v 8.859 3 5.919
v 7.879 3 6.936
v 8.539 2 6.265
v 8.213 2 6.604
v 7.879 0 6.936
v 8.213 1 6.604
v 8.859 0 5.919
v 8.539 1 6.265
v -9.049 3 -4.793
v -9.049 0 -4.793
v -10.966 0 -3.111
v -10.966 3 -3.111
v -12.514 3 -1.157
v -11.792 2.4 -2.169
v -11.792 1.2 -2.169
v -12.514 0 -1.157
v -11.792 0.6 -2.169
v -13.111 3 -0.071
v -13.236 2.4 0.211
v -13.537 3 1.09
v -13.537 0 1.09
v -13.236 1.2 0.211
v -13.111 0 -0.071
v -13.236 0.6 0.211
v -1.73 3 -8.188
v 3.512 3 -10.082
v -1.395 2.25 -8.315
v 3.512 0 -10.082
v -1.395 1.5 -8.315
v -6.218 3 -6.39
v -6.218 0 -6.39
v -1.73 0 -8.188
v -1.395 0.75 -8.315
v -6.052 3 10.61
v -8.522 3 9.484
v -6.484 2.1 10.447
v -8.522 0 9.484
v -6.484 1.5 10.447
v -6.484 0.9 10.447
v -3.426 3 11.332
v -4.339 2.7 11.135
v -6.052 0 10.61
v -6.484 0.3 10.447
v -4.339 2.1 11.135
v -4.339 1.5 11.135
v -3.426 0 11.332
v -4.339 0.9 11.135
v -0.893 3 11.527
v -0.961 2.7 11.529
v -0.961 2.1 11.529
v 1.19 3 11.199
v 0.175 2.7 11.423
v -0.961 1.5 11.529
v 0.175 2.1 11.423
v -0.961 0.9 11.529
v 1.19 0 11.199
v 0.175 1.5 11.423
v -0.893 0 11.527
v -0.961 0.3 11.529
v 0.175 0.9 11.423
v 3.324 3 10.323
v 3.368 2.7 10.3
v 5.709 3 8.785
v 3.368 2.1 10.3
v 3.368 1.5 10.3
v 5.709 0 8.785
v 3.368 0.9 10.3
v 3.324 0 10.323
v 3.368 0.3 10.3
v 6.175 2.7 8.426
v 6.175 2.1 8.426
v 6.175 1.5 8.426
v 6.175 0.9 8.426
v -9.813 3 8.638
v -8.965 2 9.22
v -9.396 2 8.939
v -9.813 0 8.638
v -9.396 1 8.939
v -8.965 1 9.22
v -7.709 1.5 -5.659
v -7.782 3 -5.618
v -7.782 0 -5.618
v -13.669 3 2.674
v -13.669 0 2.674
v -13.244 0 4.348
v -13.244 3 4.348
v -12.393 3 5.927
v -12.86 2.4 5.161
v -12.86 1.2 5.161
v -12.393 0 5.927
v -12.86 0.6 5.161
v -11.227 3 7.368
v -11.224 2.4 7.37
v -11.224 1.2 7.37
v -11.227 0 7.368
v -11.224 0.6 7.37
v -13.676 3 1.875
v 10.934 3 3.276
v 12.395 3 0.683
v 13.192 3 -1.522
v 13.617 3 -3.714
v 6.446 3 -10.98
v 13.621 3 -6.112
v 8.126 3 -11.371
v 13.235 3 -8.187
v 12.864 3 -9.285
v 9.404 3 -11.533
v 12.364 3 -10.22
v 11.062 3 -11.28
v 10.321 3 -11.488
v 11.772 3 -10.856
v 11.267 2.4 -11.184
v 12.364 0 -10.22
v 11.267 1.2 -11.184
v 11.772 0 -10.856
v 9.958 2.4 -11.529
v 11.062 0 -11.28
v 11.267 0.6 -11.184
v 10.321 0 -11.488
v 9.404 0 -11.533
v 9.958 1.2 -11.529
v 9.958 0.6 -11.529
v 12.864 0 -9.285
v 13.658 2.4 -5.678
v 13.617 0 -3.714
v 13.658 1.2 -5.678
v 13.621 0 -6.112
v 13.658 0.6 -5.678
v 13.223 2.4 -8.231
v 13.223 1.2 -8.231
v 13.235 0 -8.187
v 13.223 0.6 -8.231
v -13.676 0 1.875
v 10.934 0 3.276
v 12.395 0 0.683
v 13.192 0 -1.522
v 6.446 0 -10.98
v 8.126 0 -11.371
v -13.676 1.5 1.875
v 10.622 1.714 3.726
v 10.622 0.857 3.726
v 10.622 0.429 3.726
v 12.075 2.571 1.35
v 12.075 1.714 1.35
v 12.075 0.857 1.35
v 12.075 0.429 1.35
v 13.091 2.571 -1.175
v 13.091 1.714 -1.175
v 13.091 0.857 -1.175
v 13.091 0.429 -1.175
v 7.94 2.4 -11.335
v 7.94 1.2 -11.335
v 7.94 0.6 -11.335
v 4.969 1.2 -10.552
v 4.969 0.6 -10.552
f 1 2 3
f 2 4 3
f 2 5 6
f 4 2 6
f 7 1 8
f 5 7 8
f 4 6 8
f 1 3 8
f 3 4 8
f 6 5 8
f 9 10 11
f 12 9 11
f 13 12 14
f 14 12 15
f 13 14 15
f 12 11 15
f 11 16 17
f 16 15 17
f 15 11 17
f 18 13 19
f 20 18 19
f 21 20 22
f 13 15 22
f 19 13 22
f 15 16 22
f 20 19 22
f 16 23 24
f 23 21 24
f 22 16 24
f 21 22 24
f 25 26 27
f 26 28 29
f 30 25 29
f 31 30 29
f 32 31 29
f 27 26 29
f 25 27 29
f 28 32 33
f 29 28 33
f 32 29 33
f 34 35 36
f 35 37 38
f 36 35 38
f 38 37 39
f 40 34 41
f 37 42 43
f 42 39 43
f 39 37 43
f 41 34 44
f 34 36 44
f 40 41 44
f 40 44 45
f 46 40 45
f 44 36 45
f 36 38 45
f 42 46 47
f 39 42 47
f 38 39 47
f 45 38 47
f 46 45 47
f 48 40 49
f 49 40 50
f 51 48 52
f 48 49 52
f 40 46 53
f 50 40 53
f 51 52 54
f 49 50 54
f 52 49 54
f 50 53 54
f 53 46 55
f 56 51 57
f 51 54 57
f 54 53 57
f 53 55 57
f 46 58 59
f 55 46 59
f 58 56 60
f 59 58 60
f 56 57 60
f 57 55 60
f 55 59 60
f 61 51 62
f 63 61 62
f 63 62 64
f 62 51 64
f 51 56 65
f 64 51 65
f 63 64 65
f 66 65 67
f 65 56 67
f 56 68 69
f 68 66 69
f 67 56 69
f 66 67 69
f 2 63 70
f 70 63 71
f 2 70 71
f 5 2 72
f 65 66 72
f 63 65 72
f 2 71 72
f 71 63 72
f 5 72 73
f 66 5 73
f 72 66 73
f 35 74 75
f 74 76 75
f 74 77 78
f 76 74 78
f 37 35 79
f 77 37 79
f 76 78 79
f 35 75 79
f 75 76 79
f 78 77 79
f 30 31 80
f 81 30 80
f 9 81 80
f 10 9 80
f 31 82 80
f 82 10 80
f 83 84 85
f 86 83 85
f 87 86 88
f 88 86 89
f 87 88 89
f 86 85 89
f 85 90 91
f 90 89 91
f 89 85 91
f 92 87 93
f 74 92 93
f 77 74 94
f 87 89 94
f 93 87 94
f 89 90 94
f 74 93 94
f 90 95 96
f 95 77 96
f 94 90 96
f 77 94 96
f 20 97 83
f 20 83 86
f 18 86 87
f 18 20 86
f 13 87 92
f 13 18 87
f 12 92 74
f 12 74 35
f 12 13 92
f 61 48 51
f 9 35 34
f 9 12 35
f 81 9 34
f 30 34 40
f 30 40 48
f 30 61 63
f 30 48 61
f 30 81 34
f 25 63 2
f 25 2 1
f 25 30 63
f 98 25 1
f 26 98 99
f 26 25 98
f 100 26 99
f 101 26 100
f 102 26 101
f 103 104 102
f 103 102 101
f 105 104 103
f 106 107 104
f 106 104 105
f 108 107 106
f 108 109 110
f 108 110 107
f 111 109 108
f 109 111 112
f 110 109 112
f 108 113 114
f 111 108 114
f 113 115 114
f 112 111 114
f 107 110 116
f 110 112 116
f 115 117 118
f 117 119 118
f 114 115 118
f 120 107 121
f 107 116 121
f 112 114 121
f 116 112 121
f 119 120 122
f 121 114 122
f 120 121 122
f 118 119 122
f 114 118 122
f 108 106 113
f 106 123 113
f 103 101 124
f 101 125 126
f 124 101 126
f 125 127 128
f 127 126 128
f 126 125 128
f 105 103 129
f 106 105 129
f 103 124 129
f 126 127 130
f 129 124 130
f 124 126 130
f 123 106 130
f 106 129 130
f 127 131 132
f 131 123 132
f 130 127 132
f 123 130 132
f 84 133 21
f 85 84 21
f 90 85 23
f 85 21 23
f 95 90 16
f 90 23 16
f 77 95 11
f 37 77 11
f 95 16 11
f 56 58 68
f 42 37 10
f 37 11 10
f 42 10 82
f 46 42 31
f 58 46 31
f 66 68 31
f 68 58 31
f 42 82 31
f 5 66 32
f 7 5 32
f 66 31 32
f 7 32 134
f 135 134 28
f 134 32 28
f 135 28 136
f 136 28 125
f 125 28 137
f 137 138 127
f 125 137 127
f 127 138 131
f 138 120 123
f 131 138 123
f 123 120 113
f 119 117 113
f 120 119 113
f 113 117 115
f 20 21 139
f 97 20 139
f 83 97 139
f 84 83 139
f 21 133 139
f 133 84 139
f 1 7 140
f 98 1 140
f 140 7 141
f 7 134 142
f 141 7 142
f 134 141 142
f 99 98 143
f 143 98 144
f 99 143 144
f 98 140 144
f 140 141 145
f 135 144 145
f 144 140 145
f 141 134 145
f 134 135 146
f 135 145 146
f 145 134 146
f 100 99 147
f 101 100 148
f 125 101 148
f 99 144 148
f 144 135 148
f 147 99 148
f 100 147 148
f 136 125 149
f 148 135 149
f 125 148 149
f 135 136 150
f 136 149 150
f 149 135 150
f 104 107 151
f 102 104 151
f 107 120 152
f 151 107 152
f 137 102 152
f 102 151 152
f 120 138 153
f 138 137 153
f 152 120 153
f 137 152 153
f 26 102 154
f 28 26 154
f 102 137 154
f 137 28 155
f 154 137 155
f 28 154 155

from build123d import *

# Parameters (mm, degrees)
BOSS_EXTRUDE1_DEPTH = 3


with BuildPart() as part:
    # Sketch1 → Boss-Extrude1 (new body)
    with BuildSketch(Plane(origin=(0, 0, 0), x_dir=(1, 0, 0), z_dir=(0, 1, 0))):
        with BuildLine():
            add(Edge.make_bspline(
                [(3.511635356, 10.081993119), (2.683777353, 9.804613769), (1.863835552, 9.515160329), (0.230253693, 8.923789795), (-0.583224169, 8.621607026), (-2.206396034, 8.008419395), (-3.016273743, 7.697632699), (-4.628962954, 7.062163318), (-5.432747453, 6.738927399), (-6.217926269, 6.389737786)],
                knots=[0, 0, 0, 0, 0.25, 0.25, 0.5, 0.5, 0.75, 0.75, 1, 1, 1, 1], degree=3))
            add(Edge.make_bspline(
                [(-6.217926269, 6.389737786), (-6.732382818, 6.160945466), (-7.234463683, 5.921622924), (-8.183546206, 5.395455991), (-8.62655194, 5.105271334), (-9.048790314, 4.793117258)],
                knots=[0, 0, 0, 0, 0.5, 0.5, 1, 1, 1, 1], degree=3))
            add(Edge.make_bspline(
                [(-9.048790314, 4.793117258), (-9.572593815, 4.405877707), (-10.062014593, 3.992496155), (-10.976896057, 3.118992822), (-11.403271889, 2.656862502), (-12.180538449, 1.681198167), (-12.530629341, 1.166730201), (-12.980065384, 0.35150706), (-13.116293965, 0.073646384), (-13.355224075, -0.496551983), (-13.458532141, -0.788753111), (-13.537102217, -1.090483077)],
                knots=[0, 0, 0, 0, 0.25, 0.25, 0.5, 0.5, 0.75, 0.75, 0.875, 0.875, 1, 1, 1, 1], degree=3))
            add(Edge.make_bspline(
                [(-13.537102217, -1.090483077), (-13.604503338, -1.349321289), (-13.653312348, -1.610669429), (-13.698633086, -2.138427716), (-13.694766801, -2.404844782), (-13.669095991, -2.674304123)],
                knots=[0, 0, 0, 0, 0.5, 0.5, 1, 1, 1, 1], degree=3))
            add(Edge.make_bspline(
                [(-13.669095991, -2.674304123), (-13.614722473, -3.245047791), (-13.465072102, -3.801947796), (-13.132326792, -4.625182726), (-13.002771048, -4.897314181), (-12.716708149, -5.424764734), (-12.559270118, -5.681752652), (-12.048709516, -6.434729828), (-11.658142434, -6.914875797), (-10.790086717, -7.825956127), (-10.322161831, -8.25214747), (-9.812779765, -8.638425305)],
                knots=[0, 0, 0, 0, 0.25, 0.25, 0.375, 0.375, 0.5, 0.5, 0.75, 0.75, 1, 1, 1, 1], degree=3))
            add(Edge.make_bspline(
                [(-9.812779765, -8.638425305), (-9.403436257, -8.948841266), (-8.971187665, -9.228098087), (-8.521937596, -9.483933618)],
                knots=[0, 0, 0, 0, 1, 1, 1, 1], degree=3))
            add(Edge.make_bspline(
                [(-8.521937596, -9.483933618), (-7.864056683, -9.858578664), (-7.181432561, -10.171414143), (-5.786386578, -10.721708644), (-5.071855435, -10.953537662), (-3.605278886, -11.316866624), (-2.849475349, -11.447578253), (-1.718218003, -11.531823729), (-1.340241234, -11.541547656), (-0.582297463, -11.517303504), (-0.199738299, -11.482752797), (0.923581709, -11.304498414), (1.643632235, -11.086301788), (2.690757822, -10.644758444), (3.034652799, -10.478281819), (3.700624052, -10.1217784), (4.024775954, -9.931071044), (4.9771204, -9.330350355), (5.585407915, -8.892027633), (6.764007092, -7.960126091), (7.334081995, -7.466250249), (7.879483115, -6.936069456)],
                knots=[0, 0, 0, 0, 0.125, 0.125, 0.25, 0.25, 0.375, 0.375, 0.4375, 0.4375, 0.5, 0.5, 0.625, 0.625, 0.6875, 0.6875, 0.75, 0.75, 0.875, 0.875, 1, 1, 1, 1], degree=3))
            add(Edge.make_bspline(
                [(7.879483115, -6.936069456), (8.216997631, -6.607973846), (8.542463761, -6.268065171), (8.858866967, -5.919188104)],
                knots=[0, 0, 0, 0, 1, 1, 1, 1], degree=3))
            add(Edge.make_bspline(
                [(8.858866967, -5.919188104), (9.175012004, -5.570595703), (9.477806426, -5.211744494), (10.065358345, -4.480382001), (10.350112437, -4.107864538), (10.894645503, -3.343868548), (11.154524274, -2.95218338), (11.640475107, -2.160093023), (11.86731411, -1.758315326), (12.283393308, -0.941720152), (12.472234213, -0.526728057), (12.810730036, 0.315954522), (12.961448028, 0.745894364), (13.350899666, 2.034345662), (13.527929446, 2.882543311), (13.617402736, 3.714282252)],
                knots=[0, 0, 0, 0, 0.125, 0.125, 0.25, 0.25, 0.375, 0.375, 0.5, 0.5, 0.625, 0.625, 0.75, 0.75, 1, 1, 1, 1], degree=3))
            add(Edge.make_bspline(
                [(13.617402736, 3.714282252), (13.691377316, 4.401946011), (13.698633086, 5.056078913), (13.616829268, 6.299524933), (13.529384348, 6.890998409), (13.357643315, 7.712563059), (13.293580729, 7.976485389), (13.151674811, 8.484965664), (13.073696018, 8.729711039), (12.81899484, 9.428553754), (12.624897402, 9.850930849), (12.364040978, 10.220238878)],
                knots=[0, 0, 0, 0, 0.25, 0.25, 0.5, 0.5, 0.625, 0.625, 0.75, 0.75, 1, 1, 1, 1], degree=3))
            add(Edge.make_bspline(
                [(12.364040978, 10.220238878), (12.222991155, 10.419930461), (12.064234022, 10.600326934), (11.702300167, 10.922147541), (11.501210244, 11.064568755), (11.03340954, 11.304299052), (10.763913917, 11.40229064), (10.299063941, 11.495570799), (10.132497423, 11.517663617), (9.782710311, 11.540541943), (9.598386895, 11.541547656), (9.40449869, 11.532585416)],
                knots=[0, 0, 0, 0, 0.25, 0.25, 0.5, 0.5, 0.75, 0.75, 0.875, 0.875, 1, 1, 1, 1], degree=3))
            add(Edge.make_bspline(
                [(9.40449869, 11.532585416), (9.16948443, 11.521722176), (8.928835043, 11.496870906), (8.439557197, 11.428451446), (8.189863163, 11.384644127), (7.441044897, 11.235508513), (6.942646329, 11.113484883), (5.949151517, 10.846896987), (5.457567258, 10.702786987), (4.480489333, 10.401394029), (3.995062888, 10.243968741), (3.511635356, 10.081993119)],
                knots=[0, 0, 0, 0, 0.125, 0.125, 0.25, 0.25, 0.5, 0.5, 0.75, 0.75, 1, 1, 1, 1], degree=3))
        make_face()
    extrude(amount=BOSS_EXTRUDE1_DEPTH)


solid = part.part
